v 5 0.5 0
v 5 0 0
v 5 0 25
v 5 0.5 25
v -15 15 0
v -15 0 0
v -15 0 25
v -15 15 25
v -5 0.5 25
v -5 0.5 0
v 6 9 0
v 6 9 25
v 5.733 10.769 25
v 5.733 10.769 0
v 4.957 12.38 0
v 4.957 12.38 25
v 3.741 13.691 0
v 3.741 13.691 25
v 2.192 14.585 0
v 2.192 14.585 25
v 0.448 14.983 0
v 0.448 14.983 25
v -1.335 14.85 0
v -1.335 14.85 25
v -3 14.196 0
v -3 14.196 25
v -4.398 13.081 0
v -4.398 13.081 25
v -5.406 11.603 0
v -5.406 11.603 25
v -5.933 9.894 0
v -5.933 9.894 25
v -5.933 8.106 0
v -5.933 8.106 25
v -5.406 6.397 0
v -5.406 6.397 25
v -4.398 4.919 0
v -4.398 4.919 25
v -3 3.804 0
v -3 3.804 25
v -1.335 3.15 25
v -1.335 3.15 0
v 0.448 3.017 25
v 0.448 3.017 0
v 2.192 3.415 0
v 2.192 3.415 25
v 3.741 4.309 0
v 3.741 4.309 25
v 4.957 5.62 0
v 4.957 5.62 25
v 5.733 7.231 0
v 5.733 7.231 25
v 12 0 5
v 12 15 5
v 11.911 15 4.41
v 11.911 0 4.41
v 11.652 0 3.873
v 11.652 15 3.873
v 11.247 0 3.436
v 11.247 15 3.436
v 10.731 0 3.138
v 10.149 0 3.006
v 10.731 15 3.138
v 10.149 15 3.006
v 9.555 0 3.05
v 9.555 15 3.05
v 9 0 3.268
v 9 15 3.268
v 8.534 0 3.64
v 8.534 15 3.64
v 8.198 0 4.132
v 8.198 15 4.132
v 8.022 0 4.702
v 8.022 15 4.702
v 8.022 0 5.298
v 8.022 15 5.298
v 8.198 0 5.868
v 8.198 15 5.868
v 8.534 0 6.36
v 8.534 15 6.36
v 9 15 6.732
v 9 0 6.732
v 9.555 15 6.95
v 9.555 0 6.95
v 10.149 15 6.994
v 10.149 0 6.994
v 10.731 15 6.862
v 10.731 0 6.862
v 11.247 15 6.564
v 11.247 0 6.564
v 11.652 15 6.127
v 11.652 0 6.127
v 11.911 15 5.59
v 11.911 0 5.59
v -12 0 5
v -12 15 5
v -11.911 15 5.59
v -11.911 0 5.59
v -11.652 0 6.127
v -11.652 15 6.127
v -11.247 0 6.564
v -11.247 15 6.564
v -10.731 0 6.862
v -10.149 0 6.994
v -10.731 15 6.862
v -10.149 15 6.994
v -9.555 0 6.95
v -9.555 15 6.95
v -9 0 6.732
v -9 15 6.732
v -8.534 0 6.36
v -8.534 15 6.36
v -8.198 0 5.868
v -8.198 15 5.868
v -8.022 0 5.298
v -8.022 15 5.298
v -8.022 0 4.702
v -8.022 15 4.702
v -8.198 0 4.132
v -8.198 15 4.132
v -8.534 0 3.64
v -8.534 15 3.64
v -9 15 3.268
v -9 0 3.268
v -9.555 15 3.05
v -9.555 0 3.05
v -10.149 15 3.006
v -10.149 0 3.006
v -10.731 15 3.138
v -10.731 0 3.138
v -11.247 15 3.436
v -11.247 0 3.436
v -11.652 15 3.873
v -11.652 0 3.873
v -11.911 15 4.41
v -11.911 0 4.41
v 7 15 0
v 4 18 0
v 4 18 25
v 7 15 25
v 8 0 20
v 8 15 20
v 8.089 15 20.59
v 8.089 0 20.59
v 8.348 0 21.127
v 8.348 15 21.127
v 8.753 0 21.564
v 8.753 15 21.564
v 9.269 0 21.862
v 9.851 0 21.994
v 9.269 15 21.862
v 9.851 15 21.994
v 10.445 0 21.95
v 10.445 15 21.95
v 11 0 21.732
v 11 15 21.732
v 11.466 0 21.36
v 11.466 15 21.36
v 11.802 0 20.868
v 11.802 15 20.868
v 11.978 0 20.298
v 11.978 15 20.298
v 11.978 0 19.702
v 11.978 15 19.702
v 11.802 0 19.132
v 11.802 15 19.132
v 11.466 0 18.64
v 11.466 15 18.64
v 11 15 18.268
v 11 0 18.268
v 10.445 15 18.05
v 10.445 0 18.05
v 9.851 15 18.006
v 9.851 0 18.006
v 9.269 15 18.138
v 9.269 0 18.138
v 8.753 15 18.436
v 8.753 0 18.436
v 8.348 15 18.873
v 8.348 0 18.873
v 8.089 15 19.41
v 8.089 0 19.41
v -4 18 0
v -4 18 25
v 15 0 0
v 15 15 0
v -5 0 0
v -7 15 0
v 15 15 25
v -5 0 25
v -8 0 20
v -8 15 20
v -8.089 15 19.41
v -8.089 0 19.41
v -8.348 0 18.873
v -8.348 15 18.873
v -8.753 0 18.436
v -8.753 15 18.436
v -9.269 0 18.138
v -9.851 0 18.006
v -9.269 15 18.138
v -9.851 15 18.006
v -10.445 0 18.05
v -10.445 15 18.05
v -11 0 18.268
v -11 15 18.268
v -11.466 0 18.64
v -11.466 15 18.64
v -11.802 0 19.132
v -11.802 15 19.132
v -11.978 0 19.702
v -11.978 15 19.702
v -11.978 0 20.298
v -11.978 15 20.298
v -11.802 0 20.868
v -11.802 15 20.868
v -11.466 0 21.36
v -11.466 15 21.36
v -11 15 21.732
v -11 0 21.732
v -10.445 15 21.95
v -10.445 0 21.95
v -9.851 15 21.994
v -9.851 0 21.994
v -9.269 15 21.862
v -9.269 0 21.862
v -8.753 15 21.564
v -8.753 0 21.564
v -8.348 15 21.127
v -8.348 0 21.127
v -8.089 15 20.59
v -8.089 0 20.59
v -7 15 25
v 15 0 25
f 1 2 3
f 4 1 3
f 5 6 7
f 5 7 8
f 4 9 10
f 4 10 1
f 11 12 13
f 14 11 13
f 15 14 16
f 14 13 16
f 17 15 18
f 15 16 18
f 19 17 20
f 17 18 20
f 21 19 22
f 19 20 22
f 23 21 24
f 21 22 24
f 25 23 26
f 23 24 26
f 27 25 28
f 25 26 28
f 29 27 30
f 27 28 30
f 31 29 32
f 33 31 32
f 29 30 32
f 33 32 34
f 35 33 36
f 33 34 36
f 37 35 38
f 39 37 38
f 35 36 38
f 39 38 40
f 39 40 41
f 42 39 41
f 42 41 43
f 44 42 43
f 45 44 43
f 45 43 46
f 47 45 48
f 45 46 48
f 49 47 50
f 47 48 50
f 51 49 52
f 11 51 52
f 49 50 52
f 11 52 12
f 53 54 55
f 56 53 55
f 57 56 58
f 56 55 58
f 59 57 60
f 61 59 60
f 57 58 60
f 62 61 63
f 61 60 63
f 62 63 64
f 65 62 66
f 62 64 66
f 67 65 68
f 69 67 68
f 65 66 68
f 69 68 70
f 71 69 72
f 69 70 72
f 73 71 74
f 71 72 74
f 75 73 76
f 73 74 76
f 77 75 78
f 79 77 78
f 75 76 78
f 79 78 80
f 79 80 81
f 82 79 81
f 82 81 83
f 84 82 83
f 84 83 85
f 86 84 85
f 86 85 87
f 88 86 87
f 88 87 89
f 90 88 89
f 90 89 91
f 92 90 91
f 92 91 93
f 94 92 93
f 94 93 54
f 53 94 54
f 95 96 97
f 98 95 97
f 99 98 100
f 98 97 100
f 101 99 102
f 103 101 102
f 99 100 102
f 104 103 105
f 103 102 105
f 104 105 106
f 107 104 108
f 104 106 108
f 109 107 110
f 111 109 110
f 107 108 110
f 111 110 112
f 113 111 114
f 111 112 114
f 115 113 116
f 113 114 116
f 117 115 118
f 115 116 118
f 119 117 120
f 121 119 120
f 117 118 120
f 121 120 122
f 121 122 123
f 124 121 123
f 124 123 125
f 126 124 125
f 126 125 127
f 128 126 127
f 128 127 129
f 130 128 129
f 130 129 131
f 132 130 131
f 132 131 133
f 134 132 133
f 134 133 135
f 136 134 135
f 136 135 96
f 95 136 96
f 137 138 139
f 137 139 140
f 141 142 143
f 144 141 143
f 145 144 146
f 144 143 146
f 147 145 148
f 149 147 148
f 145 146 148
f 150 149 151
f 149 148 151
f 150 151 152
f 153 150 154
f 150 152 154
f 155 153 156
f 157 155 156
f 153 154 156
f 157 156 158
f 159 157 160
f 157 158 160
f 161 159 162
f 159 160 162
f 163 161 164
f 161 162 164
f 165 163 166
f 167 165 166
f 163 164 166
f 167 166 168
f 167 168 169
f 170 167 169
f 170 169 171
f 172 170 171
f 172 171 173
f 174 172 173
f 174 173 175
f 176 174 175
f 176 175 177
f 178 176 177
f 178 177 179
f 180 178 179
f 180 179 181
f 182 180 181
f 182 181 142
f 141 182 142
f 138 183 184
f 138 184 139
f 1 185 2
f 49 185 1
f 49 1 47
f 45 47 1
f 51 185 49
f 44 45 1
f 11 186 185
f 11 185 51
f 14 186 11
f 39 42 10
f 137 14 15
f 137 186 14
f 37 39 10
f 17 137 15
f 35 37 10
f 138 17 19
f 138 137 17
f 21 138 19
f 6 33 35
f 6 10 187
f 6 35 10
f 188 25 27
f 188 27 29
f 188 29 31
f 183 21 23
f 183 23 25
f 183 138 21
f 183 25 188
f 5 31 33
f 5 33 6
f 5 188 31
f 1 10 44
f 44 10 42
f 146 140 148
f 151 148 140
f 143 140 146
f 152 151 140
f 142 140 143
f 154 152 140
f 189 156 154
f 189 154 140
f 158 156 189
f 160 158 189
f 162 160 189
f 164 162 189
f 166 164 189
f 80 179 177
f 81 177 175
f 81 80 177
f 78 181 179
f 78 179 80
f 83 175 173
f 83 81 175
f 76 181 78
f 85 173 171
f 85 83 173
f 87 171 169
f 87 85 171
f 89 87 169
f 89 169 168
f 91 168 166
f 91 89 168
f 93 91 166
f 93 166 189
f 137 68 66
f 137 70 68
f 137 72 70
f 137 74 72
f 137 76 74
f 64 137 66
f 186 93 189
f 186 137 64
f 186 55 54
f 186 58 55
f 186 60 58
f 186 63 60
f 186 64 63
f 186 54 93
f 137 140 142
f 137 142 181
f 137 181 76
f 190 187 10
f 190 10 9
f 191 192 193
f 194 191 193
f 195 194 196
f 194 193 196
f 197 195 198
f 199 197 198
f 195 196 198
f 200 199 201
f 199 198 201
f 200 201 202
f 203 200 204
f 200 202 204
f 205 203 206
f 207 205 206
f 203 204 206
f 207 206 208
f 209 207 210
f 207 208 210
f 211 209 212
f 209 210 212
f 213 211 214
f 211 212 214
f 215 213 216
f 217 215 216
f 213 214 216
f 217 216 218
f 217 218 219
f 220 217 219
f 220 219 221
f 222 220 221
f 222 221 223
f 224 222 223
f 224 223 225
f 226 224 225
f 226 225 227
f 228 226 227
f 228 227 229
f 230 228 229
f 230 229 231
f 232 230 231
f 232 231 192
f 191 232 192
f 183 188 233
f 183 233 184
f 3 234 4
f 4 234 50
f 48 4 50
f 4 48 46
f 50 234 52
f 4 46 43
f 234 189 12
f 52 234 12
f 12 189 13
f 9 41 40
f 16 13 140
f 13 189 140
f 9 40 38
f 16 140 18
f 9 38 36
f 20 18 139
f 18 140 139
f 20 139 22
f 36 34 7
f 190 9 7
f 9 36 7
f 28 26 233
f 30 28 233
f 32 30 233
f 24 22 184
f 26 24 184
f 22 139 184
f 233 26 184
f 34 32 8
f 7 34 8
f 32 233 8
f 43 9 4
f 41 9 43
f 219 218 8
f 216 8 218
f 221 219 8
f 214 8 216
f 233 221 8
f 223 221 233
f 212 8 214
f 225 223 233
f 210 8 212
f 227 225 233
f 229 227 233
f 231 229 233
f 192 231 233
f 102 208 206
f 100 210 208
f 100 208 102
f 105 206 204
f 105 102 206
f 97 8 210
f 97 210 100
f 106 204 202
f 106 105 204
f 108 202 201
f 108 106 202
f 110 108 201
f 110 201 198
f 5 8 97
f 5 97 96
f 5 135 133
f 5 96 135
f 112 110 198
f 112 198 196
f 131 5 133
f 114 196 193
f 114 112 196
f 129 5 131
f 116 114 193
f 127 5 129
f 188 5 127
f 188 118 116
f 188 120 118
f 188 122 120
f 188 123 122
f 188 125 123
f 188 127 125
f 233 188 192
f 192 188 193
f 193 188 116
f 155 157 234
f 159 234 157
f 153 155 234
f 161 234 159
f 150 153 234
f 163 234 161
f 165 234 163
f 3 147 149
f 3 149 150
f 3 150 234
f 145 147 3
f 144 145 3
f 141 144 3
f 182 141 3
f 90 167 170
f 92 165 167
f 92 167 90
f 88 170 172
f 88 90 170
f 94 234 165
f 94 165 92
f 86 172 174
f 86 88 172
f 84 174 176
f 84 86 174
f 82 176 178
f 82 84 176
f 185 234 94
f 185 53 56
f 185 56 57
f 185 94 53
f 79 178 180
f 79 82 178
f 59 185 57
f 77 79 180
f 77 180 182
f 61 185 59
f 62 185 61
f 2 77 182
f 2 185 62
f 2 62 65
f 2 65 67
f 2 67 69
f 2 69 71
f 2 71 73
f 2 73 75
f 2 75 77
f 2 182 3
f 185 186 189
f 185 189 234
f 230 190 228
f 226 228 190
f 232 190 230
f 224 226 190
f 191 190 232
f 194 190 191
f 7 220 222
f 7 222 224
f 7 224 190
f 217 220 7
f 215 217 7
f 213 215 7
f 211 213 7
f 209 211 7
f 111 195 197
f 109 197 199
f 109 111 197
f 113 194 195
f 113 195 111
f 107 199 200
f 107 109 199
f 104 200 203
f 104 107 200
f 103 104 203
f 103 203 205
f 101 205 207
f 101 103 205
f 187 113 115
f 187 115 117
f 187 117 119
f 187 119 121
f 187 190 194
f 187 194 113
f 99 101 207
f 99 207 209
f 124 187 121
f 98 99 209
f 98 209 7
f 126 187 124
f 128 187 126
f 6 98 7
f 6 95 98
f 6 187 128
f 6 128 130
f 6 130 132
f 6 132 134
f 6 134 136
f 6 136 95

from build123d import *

# Parameters (mm, degrees)
BOSS_EXTRU_1_DEPTH      = 25
ESQUISSE2_R             = 6
ENL_V_MAT_EXTRU_1_DEPTH = 25
ESQUISSE3_R             = 2
ENL_V_MAT_EXTRU_2_DEPTH = 33.787192622
ESQUISSE4_W             = 10
ESQUISSE4_H             = 25
ENL_V_MAT_EXTRU_3_DEPTH = 0.5


with BuildPart() as part:
    # Esquisse1 → Boss.-Extru.1 (new body)
    with BuildSketch(Plane.XY):
        Polygon((15, 0), (-15, 0), (-15, 15), (-7, 15), (-4, 18), (4, 18), (7, 15), (15, 15), align=None)
    extrude(amount=BOSS_EXTRU_1_DEPTH)

    # Esquisse2 → Enlèv. mat.-Extru.1 (cut)
    with BuildSketch(Plane.XY.offset(25)):
        with Locations((0, 9)):
            Circle(ESQUISSE2_R)
    extrude(amount=-ENL_V_MAT_EXTRU_1_DEPTH, mode=Mode.SUBTRACT)

    # Esquisse3 → Enlèv. mat.-Extru.2 (cut, through all)
    with BuildSketch(Plane(origin=(0, 15, 0), x_dir=(1, 0, 0), z_dir=(0, 1, 0))):
        with Locations(Location((-10, -5, 0), (0, 0, 180))):
            Circle(ESQUISSE3_R)
        with Locations((10, -5)):
            Circle(ESQUISSE3_R)
        with Locations(Location((10, -20, 0), (0, 0, 180))):
            Circle(ESQUISSE3_R)
        with Locations((-10, -20)):
            Circle(ESQUISSE3_R)
    extrude(amount=-ENL_V_MAT_EXTRU_2_DEPTH, mode=Mode.SUBTRACT)

    # Esquisse4 → Enlèv. mat.-Extru.3 (cut)
    with BuildSketch(Plane.XZ):
        with Locations((0, 12.5)):
            Rectangle(ESQUISSE4_W, ESQUISSE4_H)
    extrude(amount=-ENL_V_MAT_EXTRU_3_DEPTH, mode=Mode.SUBTRACT)


solid = part.part
